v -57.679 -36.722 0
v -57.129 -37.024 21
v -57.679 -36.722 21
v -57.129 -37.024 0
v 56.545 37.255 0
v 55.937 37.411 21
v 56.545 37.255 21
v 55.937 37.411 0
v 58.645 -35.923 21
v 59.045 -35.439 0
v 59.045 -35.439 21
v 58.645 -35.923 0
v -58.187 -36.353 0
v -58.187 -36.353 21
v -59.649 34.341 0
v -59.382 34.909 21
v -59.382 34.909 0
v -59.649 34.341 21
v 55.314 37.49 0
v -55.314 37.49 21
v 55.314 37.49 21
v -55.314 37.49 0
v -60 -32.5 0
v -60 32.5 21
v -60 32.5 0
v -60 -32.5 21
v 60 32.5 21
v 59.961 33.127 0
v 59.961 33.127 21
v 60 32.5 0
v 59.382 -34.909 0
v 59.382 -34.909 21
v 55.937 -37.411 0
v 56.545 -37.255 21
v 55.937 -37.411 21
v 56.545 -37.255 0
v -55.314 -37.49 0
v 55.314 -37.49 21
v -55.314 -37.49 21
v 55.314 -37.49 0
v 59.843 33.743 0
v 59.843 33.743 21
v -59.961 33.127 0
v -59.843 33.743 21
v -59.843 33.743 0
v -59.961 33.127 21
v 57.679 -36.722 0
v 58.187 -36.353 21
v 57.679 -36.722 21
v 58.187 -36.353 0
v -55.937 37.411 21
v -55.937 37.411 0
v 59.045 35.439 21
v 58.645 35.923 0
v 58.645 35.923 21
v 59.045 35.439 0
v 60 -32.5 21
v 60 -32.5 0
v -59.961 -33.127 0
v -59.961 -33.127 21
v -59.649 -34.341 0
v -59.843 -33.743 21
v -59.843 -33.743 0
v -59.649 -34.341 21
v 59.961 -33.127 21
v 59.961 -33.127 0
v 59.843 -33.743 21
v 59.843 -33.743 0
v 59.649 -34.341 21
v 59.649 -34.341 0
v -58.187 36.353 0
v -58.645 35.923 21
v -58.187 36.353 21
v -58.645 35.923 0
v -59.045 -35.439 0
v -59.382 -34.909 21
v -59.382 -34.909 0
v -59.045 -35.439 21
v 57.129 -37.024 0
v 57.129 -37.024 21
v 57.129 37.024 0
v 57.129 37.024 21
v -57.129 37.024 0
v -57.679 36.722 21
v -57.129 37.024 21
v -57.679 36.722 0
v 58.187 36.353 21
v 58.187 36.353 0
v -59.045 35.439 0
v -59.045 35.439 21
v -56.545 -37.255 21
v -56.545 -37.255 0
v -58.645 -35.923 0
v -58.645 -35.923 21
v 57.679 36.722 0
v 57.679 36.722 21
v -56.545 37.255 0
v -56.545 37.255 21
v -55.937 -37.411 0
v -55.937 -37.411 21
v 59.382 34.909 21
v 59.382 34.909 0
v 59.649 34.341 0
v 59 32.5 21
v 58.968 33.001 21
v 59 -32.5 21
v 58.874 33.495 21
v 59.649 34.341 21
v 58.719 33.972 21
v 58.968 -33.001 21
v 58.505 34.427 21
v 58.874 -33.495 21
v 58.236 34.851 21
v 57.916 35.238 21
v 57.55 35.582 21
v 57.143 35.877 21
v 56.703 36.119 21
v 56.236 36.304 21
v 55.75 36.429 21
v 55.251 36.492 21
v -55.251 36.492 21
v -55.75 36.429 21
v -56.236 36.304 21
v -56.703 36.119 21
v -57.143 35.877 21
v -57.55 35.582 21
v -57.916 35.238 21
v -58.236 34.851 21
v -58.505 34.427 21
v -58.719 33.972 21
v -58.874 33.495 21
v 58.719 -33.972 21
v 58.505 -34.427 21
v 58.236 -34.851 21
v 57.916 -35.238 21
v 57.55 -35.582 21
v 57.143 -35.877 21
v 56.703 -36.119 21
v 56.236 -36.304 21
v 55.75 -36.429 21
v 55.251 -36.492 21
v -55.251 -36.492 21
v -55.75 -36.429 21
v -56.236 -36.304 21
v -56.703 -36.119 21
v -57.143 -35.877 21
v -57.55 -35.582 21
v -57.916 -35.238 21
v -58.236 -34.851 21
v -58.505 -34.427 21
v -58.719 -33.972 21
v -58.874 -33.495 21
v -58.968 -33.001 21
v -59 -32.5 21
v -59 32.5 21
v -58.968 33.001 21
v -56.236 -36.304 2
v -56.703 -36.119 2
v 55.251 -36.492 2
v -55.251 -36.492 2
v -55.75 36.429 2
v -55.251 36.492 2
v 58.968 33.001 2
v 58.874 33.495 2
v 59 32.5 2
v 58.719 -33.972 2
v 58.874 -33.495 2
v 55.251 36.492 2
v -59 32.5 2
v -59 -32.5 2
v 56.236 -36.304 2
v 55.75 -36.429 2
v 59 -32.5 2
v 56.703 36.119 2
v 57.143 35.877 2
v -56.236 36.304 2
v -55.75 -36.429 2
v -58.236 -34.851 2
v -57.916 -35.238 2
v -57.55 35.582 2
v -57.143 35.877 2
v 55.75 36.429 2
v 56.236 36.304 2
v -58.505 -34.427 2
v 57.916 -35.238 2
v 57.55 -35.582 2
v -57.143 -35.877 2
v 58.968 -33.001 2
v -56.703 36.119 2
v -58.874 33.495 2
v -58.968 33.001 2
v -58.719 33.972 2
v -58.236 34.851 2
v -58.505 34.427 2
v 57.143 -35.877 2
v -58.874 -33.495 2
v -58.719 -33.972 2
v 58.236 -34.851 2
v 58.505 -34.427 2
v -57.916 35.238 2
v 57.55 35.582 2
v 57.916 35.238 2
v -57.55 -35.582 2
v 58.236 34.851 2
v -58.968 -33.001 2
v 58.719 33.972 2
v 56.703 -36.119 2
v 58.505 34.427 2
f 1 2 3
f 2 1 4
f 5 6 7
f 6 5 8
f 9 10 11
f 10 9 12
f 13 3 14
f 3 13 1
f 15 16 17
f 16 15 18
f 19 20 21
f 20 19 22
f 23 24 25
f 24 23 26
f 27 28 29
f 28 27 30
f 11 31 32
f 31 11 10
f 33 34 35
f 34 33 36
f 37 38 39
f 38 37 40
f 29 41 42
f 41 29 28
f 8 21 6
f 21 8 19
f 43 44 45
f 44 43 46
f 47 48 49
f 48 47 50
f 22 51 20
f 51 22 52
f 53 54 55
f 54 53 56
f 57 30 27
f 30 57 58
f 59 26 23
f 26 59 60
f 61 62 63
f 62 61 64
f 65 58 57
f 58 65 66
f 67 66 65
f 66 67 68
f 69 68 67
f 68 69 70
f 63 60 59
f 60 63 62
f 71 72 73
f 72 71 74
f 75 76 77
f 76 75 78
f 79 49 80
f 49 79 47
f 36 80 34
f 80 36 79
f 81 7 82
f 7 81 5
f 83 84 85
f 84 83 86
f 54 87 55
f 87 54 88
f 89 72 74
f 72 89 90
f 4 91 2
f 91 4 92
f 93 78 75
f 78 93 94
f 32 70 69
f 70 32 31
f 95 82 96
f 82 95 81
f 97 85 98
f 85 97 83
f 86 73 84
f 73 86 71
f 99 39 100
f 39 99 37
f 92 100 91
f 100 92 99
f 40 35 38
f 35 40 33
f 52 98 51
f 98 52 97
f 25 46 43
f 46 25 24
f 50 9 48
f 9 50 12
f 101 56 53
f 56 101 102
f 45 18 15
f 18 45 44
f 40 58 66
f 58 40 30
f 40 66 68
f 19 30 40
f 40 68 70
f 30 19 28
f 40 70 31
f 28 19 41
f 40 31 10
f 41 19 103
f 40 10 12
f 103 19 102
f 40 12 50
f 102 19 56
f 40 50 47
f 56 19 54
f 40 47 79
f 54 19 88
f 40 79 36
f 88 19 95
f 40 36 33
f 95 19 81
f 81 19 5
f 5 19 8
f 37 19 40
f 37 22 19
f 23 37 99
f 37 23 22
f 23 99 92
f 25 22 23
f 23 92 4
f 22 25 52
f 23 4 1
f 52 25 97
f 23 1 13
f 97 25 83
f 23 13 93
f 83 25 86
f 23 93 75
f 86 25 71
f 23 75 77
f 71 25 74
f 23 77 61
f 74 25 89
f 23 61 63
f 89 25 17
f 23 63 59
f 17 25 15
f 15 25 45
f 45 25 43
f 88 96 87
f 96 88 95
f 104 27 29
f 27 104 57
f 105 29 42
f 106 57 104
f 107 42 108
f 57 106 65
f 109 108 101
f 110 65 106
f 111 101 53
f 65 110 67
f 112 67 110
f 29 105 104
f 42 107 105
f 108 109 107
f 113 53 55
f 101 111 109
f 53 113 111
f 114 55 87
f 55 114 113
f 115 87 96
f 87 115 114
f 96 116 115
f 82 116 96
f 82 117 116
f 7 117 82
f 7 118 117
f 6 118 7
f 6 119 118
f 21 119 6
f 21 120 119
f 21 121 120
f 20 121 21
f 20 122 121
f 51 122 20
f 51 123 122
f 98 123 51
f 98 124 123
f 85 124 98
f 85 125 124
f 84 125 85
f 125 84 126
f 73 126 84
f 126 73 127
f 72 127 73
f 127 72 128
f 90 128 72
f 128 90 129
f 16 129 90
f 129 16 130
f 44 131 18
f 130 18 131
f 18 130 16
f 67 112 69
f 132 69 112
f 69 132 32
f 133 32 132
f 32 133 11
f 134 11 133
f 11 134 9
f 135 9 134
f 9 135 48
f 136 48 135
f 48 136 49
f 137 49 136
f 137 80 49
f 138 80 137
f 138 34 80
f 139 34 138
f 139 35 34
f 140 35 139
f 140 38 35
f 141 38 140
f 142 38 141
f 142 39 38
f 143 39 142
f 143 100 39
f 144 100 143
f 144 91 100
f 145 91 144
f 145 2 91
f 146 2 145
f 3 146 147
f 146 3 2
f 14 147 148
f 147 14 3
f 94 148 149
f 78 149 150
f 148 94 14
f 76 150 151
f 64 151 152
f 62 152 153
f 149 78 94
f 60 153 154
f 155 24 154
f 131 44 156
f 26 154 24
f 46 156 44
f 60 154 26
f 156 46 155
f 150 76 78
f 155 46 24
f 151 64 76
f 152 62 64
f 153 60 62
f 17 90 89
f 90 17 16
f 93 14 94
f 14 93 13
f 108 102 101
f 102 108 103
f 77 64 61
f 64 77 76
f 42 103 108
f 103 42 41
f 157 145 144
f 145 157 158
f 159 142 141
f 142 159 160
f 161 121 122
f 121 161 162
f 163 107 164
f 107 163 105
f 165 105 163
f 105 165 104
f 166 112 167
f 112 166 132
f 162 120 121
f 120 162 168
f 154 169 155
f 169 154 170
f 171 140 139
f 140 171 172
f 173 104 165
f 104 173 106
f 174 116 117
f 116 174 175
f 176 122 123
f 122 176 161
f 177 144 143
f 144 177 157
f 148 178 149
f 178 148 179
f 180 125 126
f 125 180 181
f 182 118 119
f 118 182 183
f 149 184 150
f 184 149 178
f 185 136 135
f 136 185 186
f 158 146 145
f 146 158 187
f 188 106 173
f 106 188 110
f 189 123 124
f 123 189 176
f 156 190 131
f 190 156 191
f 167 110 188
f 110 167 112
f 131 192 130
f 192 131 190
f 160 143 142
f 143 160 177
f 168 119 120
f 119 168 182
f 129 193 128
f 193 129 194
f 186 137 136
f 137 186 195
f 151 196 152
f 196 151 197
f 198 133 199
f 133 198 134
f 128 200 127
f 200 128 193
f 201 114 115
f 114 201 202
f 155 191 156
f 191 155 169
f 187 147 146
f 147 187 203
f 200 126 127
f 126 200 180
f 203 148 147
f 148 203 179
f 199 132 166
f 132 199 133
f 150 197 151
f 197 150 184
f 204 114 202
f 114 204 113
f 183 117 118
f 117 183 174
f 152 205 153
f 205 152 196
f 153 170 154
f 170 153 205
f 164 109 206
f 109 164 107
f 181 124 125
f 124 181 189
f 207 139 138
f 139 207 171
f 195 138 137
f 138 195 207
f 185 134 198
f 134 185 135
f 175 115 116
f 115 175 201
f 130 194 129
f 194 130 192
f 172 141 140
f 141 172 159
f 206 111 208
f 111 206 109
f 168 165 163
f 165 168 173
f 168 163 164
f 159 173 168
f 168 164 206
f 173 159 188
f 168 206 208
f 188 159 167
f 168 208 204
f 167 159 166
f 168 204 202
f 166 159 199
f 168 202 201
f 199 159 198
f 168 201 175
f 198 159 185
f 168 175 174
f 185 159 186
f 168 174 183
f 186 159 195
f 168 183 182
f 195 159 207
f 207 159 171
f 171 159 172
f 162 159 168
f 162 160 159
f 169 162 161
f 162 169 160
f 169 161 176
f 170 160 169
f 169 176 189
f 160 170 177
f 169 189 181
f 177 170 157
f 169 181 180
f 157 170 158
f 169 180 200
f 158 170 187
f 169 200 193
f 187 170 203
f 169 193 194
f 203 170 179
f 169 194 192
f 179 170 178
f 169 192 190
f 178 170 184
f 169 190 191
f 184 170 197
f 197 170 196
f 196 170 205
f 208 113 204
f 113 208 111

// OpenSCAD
$fn = 50;


difference() {
	union() {
		hull() {
			translate(v = [-55.0000000000, 32.5000000000, 0]) {
				cylinder(h = 21, r = 5);
			}
			translate(v = [55.0000000000, 32.5000000000, 0]) {
				cylinder(h = 21, r = 5);
			}
			translate(v = [-55.0000000000, -32.5000000000, 0]) {
				cylinder(h = 21, r = 5);
			}
			translate(v = [55.0000000000, -32.5000000000, 0]) {
				cylinder(h = 21, r = 5);
			}
		}
	}
	union() {
		translate(v = [0, 0, 2]) {
			hull() {
				translate(v = [-55.0000000000, 32.5000000000, 0]) {
					cylinder(h = 19, r = 4);
				}
				translate(v = [55.0000000000, 32.5000000000, 0]) {
					cylinder(h = 19, r = 4);
				}
				translate(v = [-55.0000000000, -32.5000000000, 0]) {
					cylinder(h = 19, r = 4);
				}
				translate(v = [55.0000000000, -32.5000000000, 0]) {
					cylinder(h = 19, r = 4);
				}
			}
		}
	}
}
